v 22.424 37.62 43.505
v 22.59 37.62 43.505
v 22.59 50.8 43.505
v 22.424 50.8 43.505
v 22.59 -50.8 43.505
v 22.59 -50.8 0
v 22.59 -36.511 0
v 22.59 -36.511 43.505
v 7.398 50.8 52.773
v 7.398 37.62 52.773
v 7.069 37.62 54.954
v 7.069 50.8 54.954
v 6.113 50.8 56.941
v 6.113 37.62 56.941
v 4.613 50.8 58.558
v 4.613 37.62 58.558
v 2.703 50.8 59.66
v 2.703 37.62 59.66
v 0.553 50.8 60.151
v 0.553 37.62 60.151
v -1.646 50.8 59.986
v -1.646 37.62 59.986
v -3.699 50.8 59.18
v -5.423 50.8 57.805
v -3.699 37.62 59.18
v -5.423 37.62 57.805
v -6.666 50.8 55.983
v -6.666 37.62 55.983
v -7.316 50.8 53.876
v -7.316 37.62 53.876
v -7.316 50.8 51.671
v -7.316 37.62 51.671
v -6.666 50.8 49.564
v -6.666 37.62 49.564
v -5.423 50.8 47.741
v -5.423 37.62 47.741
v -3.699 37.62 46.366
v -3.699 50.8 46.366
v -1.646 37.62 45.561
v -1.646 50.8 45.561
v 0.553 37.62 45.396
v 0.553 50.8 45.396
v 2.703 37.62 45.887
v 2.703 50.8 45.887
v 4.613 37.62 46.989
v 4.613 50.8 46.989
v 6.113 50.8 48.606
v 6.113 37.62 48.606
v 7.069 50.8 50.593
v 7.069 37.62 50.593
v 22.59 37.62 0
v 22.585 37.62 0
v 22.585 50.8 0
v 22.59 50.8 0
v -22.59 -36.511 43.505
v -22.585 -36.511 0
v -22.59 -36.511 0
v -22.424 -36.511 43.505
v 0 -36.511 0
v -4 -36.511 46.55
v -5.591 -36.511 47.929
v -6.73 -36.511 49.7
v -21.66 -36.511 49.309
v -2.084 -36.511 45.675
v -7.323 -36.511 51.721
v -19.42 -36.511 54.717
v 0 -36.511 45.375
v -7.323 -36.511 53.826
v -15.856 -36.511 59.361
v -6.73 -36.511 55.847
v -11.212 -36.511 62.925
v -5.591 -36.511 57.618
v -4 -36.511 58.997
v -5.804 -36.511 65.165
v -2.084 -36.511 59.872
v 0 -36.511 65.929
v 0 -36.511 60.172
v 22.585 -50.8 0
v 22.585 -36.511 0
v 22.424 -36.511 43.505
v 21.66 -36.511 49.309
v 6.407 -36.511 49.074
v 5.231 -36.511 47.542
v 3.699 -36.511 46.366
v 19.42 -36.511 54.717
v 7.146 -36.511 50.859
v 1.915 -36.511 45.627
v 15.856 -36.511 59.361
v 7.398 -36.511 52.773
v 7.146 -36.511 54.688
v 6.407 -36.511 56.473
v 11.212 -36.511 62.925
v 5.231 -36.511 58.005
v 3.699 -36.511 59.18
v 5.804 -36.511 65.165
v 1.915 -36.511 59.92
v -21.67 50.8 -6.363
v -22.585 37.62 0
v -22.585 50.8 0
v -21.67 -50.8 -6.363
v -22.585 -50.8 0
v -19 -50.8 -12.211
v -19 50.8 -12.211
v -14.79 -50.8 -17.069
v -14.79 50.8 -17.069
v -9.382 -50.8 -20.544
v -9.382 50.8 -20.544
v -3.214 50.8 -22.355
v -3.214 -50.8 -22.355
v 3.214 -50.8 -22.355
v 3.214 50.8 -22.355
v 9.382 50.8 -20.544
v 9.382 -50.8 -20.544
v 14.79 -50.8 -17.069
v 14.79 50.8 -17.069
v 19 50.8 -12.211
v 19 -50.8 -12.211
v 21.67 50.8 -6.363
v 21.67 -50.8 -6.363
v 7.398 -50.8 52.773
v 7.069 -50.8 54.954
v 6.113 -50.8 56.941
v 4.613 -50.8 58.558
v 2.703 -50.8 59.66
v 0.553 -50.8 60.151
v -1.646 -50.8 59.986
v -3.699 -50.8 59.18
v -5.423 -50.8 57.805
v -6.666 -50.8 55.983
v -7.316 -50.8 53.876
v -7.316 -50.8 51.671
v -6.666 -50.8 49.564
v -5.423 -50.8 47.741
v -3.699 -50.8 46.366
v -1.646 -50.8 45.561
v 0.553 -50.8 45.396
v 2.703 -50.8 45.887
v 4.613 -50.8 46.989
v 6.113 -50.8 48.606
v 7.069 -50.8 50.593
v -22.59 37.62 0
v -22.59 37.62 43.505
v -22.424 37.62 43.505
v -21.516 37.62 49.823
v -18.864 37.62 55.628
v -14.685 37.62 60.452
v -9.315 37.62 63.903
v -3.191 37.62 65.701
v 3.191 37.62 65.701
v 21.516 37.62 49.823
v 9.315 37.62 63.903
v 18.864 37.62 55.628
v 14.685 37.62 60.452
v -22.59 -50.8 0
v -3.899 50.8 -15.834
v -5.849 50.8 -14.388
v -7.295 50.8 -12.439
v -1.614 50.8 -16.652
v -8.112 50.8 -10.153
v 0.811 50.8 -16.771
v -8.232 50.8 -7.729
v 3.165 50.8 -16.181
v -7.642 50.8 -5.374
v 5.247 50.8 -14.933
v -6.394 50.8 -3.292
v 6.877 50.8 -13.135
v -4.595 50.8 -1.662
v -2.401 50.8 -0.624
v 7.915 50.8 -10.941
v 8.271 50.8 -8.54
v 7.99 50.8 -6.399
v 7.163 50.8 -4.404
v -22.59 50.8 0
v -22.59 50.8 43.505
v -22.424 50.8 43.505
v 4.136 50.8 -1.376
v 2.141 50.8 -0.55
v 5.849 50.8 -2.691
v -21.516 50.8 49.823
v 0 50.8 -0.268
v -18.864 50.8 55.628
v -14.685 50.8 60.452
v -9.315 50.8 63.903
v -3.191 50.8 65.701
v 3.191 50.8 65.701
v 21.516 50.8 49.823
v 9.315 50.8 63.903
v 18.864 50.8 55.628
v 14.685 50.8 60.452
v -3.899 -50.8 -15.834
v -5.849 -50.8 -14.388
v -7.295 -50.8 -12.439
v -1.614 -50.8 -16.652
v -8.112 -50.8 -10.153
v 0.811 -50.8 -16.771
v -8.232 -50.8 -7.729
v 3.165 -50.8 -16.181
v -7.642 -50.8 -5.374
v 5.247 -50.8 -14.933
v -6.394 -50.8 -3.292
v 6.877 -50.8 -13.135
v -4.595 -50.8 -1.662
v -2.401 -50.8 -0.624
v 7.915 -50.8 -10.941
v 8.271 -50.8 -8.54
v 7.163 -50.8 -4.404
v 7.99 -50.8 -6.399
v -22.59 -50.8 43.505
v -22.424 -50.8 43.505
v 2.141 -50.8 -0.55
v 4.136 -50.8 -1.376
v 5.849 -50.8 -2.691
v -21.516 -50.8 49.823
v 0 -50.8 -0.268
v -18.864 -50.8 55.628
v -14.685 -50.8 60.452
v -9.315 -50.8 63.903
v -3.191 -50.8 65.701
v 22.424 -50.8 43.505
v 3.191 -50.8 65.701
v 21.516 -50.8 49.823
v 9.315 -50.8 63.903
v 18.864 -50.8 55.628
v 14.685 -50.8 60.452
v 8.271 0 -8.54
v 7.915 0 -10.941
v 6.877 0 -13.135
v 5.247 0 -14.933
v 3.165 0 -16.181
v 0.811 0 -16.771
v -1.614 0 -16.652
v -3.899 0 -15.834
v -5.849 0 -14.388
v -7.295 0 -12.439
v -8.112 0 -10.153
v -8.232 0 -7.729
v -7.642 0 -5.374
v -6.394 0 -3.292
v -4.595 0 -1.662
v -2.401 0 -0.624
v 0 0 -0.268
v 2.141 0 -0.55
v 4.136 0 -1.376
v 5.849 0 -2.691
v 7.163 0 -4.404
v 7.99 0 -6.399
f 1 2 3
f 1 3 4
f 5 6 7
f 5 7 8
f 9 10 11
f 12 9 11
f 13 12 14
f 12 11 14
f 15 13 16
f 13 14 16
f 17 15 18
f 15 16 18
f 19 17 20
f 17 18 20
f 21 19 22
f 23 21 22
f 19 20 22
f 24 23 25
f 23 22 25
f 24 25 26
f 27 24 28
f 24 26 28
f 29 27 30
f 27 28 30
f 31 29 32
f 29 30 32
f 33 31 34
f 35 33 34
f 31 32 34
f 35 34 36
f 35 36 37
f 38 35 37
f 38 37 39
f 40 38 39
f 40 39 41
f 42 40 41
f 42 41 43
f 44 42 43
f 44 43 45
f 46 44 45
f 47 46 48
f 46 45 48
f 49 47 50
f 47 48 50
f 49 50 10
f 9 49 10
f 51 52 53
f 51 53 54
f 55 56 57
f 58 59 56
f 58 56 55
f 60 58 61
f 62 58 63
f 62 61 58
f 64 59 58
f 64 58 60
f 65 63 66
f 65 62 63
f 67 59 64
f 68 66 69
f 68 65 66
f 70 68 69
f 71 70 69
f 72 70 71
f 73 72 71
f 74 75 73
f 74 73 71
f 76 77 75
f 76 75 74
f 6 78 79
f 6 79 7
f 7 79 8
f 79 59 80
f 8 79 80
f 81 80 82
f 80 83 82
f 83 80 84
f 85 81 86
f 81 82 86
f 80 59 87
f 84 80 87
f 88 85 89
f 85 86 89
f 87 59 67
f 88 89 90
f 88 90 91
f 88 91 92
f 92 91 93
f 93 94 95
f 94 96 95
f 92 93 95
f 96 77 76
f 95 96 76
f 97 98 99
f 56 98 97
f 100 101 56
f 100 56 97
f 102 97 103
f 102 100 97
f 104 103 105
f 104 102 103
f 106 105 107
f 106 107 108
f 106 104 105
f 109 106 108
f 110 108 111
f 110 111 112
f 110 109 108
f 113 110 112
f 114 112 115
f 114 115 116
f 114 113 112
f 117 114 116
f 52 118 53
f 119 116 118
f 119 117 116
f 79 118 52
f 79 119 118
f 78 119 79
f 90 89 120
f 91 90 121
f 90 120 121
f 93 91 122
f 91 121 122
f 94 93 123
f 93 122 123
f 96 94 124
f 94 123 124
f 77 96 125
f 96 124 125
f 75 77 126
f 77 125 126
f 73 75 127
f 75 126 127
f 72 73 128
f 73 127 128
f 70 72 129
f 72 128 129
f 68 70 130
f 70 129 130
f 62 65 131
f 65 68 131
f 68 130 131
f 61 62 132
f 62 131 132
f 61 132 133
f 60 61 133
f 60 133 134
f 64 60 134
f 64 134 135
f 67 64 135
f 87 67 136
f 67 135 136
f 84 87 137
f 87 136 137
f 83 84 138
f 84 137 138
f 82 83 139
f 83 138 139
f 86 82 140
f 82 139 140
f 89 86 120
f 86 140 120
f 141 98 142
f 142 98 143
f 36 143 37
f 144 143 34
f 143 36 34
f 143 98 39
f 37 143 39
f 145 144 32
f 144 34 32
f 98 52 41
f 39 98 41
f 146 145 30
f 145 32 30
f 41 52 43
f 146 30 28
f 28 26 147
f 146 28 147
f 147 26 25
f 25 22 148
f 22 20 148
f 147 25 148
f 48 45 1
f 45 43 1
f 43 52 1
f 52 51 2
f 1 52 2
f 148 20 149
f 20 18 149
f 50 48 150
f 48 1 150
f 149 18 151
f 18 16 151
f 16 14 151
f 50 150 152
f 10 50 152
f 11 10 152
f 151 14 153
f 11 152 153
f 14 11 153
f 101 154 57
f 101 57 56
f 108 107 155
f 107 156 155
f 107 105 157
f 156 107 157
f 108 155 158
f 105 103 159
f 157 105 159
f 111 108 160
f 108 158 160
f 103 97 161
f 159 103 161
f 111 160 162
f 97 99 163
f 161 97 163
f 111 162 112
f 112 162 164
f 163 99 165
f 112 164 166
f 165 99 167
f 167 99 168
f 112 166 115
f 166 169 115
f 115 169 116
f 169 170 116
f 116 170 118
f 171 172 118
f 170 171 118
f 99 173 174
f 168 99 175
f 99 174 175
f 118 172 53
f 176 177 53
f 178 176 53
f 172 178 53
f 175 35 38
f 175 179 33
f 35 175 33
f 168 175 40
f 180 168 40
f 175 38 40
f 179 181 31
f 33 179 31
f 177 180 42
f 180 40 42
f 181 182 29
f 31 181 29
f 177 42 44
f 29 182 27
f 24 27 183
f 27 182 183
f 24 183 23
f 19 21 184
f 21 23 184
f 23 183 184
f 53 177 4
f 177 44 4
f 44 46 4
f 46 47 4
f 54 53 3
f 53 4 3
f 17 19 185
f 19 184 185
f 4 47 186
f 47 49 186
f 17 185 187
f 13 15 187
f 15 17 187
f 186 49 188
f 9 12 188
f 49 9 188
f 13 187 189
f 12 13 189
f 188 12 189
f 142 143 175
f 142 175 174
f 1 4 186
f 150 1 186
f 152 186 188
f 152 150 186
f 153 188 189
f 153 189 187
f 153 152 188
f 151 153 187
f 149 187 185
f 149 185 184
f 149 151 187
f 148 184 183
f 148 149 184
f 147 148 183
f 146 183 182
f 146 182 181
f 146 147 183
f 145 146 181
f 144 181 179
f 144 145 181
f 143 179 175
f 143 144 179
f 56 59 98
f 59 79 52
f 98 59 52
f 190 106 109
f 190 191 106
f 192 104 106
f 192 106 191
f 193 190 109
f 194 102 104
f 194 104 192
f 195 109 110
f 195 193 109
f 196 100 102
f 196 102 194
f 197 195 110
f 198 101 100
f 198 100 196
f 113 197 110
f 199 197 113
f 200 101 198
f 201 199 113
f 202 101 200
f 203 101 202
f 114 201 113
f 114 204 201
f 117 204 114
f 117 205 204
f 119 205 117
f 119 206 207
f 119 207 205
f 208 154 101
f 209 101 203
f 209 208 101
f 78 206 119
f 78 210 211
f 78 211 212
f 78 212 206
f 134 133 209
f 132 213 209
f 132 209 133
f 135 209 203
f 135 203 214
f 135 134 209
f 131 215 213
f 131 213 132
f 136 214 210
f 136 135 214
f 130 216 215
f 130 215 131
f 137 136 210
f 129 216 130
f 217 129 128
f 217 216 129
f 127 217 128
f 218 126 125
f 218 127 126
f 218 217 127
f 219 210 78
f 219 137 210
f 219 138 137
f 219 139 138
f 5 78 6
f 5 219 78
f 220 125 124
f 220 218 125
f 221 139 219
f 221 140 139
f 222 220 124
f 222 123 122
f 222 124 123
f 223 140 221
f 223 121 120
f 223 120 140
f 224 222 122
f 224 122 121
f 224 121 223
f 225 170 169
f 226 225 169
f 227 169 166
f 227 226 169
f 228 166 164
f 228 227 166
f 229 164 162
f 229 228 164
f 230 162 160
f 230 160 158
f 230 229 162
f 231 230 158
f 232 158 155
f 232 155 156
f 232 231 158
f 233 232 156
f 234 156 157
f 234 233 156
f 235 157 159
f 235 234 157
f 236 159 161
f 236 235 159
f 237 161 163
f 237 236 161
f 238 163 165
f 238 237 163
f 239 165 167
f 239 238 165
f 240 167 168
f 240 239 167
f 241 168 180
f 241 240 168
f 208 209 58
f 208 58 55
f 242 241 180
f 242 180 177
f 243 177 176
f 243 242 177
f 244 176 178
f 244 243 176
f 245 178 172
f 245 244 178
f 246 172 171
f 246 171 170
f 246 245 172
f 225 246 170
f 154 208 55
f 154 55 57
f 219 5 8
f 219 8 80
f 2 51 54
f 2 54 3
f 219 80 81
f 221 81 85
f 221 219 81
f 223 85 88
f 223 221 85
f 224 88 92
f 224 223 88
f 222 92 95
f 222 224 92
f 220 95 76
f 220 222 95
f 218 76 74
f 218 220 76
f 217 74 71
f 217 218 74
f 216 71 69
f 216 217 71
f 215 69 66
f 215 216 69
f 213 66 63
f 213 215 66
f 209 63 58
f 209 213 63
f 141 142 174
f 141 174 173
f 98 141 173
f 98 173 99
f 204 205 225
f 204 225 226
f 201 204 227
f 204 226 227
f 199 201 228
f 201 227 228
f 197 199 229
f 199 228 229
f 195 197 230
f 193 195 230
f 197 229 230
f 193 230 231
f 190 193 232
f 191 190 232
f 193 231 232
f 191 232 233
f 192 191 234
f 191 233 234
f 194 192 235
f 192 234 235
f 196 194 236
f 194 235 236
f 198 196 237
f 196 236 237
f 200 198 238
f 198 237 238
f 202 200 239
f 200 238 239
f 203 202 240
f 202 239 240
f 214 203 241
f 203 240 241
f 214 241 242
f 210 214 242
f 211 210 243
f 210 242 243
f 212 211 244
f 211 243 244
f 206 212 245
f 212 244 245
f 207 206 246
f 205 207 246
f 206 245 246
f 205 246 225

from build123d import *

# Parameters (mm, degrees)
F0_R          = 7.3981618973
F1_DEPTH      = 50.8
F1_DEPTH_BACK = 50.8
F2_W          = 74.1309896111
F2_H          = 66.0332143307
F3_DEPTH      = 25.4
F3_DEPTH_BACK = 25.4


# Not quite as in the source:
# - the program builds the solid bodies; features that only make, move or delete a surface that nothing else refers to are left out


with BuildPart() as f1:
    # F0 (on Front) → F1 (new body, two sides)
    with BuildSketch(Plane.XZ) as f1_sk:
        with BuildLine():
            Line((-22.5902460515, 0), (-22.5853170946, 0))
            ThreePointArc((-22.5853170946, 0), (0, -22.5853170946), (22.5853170946, 0))
            Line((22.5853170946, 0), (22.5902460515, 0))
            Line((22.5902460515, 0), (22.5902460515, 43.5050576925))
            Line((22.5902460515, 43.5050576925), (22.4241250182, 43.5050576925))
            ThreePointArc((22.4241250182, 43.5050576925), (0, 65.9291827108), (-22.4241250182, 43.5050576925))
            Line((-22.4241250182, 43.5050576925), (-22.5902460515, 43.5050576925))
            Line((-22.5902460515, 43.5050576925), (-22.5902460515, 0))
        make_face()
        with BuildLine():
            ThreePointArc((0, -0.2681852946), (5.848754541, -2.6908187485), (8.2713879948, -8.5395732895))
            ThreePointArc((8.2713879948, -8.5395732895), (-5.848754541, -14.3883278304), (0, -0.2681852946))
        make_face(mode=Mode.SUBTRACT)
        with Locations((0, 52.7734495699)):
            Circle(F0_R, mode=Mode.SUBTRACT)
    extrude(amount=F1_DEPTH)
    extrude(f1_sk.sketch, amount=-F1_DEPTH_BACK)

    # F2 (on Right) → F3 (cut, two sides)
    with BuildSketch(Plane.YZ) as f3_sk:
        with Locations((0.5546920002, 33.0166071653)):
            Rectangle(F2_W, F2_H)
    extrude(amount=-F3_DEPTH, mode=Mode.SUBTRACT)
    extrude(f3_sk.sketch, amount=F3_DEPTH_BACK, mode=Mode.SUBTRACT)


solid = f1.part
